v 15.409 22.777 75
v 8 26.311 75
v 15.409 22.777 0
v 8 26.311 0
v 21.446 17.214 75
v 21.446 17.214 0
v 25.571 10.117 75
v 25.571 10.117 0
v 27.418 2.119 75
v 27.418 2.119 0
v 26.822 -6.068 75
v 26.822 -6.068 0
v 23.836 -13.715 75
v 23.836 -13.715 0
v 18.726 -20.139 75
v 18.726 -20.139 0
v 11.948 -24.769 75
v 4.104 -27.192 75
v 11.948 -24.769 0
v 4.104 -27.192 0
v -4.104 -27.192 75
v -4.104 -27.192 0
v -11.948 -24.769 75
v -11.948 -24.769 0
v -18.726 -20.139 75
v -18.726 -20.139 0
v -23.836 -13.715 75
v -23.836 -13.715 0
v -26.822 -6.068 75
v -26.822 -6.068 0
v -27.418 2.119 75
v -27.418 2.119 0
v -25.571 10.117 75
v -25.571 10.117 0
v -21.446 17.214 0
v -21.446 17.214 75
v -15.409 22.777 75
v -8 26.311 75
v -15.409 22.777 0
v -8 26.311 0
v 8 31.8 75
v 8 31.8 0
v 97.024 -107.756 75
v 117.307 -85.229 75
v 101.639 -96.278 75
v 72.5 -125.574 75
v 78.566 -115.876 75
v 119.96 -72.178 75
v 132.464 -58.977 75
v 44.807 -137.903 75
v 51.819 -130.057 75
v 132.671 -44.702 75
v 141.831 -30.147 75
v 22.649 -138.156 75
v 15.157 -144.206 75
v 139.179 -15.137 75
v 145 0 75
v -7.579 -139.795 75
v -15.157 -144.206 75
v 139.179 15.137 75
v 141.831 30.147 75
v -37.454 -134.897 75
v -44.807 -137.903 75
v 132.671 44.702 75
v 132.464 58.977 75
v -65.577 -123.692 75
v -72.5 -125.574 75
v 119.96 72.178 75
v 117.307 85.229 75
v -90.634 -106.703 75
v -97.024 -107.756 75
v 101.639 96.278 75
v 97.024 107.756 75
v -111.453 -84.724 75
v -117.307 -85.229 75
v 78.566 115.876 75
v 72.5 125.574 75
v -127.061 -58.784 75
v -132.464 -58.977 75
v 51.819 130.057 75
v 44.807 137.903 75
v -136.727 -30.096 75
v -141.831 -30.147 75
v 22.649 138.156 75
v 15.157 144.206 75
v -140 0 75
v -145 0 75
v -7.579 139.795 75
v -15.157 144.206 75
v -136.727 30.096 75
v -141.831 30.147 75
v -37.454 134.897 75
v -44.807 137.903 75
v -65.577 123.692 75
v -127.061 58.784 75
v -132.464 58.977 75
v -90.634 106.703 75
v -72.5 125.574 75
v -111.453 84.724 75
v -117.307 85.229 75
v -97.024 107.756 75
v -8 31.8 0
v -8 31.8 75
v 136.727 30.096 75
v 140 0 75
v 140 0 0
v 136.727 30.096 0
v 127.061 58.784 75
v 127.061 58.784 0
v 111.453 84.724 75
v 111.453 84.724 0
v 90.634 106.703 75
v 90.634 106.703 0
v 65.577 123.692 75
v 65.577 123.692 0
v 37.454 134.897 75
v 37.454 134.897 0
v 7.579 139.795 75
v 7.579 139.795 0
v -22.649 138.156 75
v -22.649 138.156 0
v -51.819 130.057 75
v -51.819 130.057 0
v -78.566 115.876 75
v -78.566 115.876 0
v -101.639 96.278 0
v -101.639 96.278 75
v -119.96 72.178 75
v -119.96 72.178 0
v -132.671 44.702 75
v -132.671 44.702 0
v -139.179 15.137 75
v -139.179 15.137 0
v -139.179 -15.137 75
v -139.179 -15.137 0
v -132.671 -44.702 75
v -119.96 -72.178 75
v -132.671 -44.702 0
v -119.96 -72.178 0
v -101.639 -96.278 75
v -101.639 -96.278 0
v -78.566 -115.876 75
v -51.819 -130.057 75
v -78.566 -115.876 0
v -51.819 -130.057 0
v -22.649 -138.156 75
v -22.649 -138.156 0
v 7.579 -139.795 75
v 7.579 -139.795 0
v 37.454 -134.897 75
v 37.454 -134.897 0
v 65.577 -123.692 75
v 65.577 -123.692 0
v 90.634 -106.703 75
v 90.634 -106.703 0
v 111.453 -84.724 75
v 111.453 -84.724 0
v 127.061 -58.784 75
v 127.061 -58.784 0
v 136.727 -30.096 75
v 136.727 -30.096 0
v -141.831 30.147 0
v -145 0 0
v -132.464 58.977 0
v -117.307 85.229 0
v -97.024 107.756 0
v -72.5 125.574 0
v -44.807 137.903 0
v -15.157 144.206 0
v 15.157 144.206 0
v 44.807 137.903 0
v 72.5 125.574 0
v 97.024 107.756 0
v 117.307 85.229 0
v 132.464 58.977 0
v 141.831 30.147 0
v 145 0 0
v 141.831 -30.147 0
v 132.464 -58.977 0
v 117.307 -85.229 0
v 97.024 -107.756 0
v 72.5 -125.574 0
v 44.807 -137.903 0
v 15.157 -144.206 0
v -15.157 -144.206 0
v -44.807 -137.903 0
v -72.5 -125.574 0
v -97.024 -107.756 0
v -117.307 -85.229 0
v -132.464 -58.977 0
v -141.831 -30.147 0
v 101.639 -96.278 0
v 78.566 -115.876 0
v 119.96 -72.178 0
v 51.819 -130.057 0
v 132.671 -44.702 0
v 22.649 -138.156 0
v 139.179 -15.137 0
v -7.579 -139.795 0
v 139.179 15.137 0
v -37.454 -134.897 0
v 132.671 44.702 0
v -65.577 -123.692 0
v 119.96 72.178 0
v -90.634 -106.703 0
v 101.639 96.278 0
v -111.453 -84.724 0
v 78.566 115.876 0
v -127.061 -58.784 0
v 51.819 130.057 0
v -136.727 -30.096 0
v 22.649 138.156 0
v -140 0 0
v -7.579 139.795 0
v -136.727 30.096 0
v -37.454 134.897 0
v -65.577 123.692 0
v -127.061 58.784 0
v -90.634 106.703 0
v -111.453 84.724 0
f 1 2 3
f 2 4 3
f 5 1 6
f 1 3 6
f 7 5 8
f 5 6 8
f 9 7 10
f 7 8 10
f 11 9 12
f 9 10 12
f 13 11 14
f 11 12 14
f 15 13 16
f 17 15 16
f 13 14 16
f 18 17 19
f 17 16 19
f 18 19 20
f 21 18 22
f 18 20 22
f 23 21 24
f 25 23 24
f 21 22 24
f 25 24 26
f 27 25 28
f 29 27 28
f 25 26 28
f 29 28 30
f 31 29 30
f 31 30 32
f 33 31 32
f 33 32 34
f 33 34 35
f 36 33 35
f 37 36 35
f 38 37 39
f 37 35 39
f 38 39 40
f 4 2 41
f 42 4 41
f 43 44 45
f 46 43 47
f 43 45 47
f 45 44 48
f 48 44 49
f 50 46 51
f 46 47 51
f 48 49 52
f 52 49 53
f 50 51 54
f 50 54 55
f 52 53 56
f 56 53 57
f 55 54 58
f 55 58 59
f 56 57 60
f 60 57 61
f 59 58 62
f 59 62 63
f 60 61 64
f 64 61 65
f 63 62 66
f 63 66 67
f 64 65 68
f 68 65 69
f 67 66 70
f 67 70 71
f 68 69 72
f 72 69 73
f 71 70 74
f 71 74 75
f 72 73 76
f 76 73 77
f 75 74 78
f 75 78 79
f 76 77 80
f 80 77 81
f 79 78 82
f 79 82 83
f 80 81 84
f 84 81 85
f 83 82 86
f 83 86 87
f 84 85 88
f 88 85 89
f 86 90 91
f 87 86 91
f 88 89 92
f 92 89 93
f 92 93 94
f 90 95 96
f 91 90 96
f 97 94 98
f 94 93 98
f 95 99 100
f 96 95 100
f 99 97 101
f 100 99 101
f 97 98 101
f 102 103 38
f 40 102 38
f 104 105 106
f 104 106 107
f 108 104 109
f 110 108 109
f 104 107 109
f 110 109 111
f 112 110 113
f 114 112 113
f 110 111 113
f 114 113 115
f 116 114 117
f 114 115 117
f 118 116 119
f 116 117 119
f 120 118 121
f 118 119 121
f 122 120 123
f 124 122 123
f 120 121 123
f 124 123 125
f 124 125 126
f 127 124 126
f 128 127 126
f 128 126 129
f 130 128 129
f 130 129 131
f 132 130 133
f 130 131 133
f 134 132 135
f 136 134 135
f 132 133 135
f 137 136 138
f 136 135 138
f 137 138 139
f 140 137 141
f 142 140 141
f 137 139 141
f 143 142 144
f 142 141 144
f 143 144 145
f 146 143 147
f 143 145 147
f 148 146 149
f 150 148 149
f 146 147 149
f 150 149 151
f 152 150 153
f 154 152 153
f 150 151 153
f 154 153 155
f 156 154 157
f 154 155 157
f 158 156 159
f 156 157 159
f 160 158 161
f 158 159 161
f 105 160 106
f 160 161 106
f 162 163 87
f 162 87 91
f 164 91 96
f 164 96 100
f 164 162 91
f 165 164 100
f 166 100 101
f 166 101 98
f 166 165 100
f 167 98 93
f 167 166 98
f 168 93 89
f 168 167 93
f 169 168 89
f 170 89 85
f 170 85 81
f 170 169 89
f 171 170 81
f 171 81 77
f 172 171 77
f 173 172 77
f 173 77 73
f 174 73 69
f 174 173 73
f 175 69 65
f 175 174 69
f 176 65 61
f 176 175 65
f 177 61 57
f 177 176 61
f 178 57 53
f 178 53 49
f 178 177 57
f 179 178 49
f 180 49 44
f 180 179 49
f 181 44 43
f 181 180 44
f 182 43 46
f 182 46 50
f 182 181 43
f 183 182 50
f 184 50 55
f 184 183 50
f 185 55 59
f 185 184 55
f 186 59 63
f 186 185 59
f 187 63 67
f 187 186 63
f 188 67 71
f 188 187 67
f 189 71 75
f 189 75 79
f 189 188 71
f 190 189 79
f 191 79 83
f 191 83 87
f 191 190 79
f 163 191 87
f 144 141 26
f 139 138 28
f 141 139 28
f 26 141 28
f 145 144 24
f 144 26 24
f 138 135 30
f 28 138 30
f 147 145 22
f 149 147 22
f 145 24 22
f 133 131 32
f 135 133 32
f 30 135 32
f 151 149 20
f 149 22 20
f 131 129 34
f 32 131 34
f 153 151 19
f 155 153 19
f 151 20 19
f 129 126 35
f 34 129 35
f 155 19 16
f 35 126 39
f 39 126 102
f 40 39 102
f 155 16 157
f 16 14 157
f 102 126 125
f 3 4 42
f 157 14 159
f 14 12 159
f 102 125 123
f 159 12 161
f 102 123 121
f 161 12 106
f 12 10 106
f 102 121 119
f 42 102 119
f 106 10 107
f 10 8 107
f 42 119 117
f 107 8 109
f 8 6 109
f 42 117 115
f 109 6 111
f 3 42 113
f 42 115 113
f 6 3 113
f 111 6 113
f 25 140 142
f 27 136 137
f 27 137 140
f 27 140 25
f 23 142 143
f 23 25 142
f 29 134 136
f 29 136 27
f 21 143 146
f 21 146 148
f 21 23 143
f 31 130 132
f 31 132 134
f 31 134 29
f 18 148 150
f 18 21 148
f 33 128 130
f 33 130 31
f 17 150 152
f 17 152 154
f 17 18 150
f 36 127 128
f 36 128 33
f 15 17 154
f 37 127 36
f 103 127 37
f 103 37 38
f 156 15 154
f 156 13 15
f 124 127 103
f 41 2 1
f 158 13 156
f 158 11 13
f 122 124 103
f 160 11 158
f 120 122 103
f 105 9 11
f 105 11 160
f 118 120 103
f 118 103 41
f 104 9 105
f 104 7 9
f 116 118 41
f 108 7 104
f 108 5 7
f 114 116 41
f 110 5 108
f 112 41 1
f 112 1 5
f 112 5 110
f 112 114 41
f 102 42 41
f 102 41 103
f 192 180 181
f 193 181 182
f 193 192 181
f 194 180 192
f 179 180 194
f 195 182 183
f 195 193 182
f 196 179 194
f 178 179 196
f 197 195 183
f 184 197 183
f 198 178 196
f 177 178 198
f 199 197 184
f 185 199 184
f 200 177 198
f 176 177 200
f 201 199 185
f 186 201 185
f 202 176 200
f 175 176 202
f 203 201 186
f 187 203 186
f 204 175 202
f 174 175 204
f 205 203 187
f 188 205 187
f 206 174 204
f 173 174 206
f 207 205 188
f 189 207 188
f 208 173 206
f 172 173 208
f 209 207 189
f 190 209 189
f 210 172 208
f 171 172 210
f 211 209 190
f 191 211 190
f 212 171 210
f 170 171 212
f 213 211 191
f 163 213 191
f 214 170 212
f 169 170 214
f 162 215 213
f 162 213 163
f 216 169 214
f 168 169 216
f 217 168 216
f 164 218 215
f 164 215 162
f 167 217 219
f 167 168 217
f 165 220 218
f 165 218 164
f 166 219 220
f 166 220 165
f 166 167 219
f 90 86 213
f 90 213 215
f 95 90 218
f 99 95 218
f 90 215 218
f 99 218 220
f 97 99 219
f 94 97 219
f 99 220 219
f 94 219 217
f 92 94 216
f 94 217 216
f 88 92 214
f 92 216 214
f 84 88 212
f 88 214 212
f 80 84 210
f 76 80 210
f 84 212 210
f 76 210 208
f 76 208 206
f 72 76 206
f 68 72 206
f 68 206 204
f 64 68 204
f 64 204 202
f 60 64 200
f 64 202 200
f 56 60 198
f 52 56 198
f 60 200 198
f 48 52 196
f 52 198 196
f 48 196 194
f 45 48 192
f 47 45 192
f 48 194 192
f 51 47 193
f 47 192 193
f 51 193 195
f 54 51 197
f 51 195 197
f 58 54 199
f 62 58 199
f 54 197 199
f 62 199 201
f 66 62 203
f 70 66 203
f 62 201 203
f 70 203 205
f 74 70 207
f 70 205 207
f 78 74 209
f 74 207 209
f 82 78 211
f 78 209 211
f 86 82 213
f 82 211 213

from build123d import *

# Parameters (mm, degrees)
SKETCH1_R           = 140
BOSS_EXTRUDE1_DEPTH = 75
SKETCH2_R           = 27.5
CUT_EXTRUDE1_DEPTH  = 212.719153597
CUT_EXTRUDE2_DEPTH  = 212.719153597
SKETCH4_R           = 145
SKETCH4_R_2         = 140
BOSS_EXTRUDE2_DEPTH = 75


with BuildPart() as part:
    # Sketch1 → Boss-Extrude1 (new body)
    with BuildSketch(Plane.XY):
        Circle(SKETCH1_R)
    extrude(amount=BOSS_EXTRUDE1_DEPTH)

    # Sketch2 → Cut-Extrude1 (cut, through all)
    with BuildSketch(Plane(origin=(0, 0, 0), x_dir=(-1, 0, 0), z_dir=(0, 0, -1))):
        Circle(SKETCH2_R)
    extrude(amount=-CUT_EXTRUDE1_DEPTH, mode=Mode.SUBTRACT)

    # Sketch3 → Cut-Extrude2 (cut, through all)
    with BuildSketch(Plane(origin=(0, 0, 0), x_dir=(-1, 0, 0), z_dir=(0, 0, -1))):
        with BuildLine():
            Line((-8, 26.310644234), (-8, 31.8))
            Line((-8, 31.8), (8, 31.8))
            Line((8, 31.8), (8, 26.310644234))
            ThreePointArc((8, 26.310644234), (0, 27.5), (-8, 26.310644234))
        make_face()
    extrude(amount=-CUT_EXTRUDE2_DEPTH, mode=Mode.SUBTRACT)


with BuildPart() as body_2:
    # Sketch4 → Boss-Extrude2 (new body)
    with BuildSketch(Plane(origin=(0, 0, 0), x_dir=(-1, 0, 0), z_dir=(0, 0, -1))):
        Circle(SKETCH4_R)
        Circle(SKETCH4_R_2, mode=Mode.SUBTRACT)
    extrude(amount=-BOSS_EXTRUDE2_DEPTH)


solid = Compound([part.part, body_2.part])
